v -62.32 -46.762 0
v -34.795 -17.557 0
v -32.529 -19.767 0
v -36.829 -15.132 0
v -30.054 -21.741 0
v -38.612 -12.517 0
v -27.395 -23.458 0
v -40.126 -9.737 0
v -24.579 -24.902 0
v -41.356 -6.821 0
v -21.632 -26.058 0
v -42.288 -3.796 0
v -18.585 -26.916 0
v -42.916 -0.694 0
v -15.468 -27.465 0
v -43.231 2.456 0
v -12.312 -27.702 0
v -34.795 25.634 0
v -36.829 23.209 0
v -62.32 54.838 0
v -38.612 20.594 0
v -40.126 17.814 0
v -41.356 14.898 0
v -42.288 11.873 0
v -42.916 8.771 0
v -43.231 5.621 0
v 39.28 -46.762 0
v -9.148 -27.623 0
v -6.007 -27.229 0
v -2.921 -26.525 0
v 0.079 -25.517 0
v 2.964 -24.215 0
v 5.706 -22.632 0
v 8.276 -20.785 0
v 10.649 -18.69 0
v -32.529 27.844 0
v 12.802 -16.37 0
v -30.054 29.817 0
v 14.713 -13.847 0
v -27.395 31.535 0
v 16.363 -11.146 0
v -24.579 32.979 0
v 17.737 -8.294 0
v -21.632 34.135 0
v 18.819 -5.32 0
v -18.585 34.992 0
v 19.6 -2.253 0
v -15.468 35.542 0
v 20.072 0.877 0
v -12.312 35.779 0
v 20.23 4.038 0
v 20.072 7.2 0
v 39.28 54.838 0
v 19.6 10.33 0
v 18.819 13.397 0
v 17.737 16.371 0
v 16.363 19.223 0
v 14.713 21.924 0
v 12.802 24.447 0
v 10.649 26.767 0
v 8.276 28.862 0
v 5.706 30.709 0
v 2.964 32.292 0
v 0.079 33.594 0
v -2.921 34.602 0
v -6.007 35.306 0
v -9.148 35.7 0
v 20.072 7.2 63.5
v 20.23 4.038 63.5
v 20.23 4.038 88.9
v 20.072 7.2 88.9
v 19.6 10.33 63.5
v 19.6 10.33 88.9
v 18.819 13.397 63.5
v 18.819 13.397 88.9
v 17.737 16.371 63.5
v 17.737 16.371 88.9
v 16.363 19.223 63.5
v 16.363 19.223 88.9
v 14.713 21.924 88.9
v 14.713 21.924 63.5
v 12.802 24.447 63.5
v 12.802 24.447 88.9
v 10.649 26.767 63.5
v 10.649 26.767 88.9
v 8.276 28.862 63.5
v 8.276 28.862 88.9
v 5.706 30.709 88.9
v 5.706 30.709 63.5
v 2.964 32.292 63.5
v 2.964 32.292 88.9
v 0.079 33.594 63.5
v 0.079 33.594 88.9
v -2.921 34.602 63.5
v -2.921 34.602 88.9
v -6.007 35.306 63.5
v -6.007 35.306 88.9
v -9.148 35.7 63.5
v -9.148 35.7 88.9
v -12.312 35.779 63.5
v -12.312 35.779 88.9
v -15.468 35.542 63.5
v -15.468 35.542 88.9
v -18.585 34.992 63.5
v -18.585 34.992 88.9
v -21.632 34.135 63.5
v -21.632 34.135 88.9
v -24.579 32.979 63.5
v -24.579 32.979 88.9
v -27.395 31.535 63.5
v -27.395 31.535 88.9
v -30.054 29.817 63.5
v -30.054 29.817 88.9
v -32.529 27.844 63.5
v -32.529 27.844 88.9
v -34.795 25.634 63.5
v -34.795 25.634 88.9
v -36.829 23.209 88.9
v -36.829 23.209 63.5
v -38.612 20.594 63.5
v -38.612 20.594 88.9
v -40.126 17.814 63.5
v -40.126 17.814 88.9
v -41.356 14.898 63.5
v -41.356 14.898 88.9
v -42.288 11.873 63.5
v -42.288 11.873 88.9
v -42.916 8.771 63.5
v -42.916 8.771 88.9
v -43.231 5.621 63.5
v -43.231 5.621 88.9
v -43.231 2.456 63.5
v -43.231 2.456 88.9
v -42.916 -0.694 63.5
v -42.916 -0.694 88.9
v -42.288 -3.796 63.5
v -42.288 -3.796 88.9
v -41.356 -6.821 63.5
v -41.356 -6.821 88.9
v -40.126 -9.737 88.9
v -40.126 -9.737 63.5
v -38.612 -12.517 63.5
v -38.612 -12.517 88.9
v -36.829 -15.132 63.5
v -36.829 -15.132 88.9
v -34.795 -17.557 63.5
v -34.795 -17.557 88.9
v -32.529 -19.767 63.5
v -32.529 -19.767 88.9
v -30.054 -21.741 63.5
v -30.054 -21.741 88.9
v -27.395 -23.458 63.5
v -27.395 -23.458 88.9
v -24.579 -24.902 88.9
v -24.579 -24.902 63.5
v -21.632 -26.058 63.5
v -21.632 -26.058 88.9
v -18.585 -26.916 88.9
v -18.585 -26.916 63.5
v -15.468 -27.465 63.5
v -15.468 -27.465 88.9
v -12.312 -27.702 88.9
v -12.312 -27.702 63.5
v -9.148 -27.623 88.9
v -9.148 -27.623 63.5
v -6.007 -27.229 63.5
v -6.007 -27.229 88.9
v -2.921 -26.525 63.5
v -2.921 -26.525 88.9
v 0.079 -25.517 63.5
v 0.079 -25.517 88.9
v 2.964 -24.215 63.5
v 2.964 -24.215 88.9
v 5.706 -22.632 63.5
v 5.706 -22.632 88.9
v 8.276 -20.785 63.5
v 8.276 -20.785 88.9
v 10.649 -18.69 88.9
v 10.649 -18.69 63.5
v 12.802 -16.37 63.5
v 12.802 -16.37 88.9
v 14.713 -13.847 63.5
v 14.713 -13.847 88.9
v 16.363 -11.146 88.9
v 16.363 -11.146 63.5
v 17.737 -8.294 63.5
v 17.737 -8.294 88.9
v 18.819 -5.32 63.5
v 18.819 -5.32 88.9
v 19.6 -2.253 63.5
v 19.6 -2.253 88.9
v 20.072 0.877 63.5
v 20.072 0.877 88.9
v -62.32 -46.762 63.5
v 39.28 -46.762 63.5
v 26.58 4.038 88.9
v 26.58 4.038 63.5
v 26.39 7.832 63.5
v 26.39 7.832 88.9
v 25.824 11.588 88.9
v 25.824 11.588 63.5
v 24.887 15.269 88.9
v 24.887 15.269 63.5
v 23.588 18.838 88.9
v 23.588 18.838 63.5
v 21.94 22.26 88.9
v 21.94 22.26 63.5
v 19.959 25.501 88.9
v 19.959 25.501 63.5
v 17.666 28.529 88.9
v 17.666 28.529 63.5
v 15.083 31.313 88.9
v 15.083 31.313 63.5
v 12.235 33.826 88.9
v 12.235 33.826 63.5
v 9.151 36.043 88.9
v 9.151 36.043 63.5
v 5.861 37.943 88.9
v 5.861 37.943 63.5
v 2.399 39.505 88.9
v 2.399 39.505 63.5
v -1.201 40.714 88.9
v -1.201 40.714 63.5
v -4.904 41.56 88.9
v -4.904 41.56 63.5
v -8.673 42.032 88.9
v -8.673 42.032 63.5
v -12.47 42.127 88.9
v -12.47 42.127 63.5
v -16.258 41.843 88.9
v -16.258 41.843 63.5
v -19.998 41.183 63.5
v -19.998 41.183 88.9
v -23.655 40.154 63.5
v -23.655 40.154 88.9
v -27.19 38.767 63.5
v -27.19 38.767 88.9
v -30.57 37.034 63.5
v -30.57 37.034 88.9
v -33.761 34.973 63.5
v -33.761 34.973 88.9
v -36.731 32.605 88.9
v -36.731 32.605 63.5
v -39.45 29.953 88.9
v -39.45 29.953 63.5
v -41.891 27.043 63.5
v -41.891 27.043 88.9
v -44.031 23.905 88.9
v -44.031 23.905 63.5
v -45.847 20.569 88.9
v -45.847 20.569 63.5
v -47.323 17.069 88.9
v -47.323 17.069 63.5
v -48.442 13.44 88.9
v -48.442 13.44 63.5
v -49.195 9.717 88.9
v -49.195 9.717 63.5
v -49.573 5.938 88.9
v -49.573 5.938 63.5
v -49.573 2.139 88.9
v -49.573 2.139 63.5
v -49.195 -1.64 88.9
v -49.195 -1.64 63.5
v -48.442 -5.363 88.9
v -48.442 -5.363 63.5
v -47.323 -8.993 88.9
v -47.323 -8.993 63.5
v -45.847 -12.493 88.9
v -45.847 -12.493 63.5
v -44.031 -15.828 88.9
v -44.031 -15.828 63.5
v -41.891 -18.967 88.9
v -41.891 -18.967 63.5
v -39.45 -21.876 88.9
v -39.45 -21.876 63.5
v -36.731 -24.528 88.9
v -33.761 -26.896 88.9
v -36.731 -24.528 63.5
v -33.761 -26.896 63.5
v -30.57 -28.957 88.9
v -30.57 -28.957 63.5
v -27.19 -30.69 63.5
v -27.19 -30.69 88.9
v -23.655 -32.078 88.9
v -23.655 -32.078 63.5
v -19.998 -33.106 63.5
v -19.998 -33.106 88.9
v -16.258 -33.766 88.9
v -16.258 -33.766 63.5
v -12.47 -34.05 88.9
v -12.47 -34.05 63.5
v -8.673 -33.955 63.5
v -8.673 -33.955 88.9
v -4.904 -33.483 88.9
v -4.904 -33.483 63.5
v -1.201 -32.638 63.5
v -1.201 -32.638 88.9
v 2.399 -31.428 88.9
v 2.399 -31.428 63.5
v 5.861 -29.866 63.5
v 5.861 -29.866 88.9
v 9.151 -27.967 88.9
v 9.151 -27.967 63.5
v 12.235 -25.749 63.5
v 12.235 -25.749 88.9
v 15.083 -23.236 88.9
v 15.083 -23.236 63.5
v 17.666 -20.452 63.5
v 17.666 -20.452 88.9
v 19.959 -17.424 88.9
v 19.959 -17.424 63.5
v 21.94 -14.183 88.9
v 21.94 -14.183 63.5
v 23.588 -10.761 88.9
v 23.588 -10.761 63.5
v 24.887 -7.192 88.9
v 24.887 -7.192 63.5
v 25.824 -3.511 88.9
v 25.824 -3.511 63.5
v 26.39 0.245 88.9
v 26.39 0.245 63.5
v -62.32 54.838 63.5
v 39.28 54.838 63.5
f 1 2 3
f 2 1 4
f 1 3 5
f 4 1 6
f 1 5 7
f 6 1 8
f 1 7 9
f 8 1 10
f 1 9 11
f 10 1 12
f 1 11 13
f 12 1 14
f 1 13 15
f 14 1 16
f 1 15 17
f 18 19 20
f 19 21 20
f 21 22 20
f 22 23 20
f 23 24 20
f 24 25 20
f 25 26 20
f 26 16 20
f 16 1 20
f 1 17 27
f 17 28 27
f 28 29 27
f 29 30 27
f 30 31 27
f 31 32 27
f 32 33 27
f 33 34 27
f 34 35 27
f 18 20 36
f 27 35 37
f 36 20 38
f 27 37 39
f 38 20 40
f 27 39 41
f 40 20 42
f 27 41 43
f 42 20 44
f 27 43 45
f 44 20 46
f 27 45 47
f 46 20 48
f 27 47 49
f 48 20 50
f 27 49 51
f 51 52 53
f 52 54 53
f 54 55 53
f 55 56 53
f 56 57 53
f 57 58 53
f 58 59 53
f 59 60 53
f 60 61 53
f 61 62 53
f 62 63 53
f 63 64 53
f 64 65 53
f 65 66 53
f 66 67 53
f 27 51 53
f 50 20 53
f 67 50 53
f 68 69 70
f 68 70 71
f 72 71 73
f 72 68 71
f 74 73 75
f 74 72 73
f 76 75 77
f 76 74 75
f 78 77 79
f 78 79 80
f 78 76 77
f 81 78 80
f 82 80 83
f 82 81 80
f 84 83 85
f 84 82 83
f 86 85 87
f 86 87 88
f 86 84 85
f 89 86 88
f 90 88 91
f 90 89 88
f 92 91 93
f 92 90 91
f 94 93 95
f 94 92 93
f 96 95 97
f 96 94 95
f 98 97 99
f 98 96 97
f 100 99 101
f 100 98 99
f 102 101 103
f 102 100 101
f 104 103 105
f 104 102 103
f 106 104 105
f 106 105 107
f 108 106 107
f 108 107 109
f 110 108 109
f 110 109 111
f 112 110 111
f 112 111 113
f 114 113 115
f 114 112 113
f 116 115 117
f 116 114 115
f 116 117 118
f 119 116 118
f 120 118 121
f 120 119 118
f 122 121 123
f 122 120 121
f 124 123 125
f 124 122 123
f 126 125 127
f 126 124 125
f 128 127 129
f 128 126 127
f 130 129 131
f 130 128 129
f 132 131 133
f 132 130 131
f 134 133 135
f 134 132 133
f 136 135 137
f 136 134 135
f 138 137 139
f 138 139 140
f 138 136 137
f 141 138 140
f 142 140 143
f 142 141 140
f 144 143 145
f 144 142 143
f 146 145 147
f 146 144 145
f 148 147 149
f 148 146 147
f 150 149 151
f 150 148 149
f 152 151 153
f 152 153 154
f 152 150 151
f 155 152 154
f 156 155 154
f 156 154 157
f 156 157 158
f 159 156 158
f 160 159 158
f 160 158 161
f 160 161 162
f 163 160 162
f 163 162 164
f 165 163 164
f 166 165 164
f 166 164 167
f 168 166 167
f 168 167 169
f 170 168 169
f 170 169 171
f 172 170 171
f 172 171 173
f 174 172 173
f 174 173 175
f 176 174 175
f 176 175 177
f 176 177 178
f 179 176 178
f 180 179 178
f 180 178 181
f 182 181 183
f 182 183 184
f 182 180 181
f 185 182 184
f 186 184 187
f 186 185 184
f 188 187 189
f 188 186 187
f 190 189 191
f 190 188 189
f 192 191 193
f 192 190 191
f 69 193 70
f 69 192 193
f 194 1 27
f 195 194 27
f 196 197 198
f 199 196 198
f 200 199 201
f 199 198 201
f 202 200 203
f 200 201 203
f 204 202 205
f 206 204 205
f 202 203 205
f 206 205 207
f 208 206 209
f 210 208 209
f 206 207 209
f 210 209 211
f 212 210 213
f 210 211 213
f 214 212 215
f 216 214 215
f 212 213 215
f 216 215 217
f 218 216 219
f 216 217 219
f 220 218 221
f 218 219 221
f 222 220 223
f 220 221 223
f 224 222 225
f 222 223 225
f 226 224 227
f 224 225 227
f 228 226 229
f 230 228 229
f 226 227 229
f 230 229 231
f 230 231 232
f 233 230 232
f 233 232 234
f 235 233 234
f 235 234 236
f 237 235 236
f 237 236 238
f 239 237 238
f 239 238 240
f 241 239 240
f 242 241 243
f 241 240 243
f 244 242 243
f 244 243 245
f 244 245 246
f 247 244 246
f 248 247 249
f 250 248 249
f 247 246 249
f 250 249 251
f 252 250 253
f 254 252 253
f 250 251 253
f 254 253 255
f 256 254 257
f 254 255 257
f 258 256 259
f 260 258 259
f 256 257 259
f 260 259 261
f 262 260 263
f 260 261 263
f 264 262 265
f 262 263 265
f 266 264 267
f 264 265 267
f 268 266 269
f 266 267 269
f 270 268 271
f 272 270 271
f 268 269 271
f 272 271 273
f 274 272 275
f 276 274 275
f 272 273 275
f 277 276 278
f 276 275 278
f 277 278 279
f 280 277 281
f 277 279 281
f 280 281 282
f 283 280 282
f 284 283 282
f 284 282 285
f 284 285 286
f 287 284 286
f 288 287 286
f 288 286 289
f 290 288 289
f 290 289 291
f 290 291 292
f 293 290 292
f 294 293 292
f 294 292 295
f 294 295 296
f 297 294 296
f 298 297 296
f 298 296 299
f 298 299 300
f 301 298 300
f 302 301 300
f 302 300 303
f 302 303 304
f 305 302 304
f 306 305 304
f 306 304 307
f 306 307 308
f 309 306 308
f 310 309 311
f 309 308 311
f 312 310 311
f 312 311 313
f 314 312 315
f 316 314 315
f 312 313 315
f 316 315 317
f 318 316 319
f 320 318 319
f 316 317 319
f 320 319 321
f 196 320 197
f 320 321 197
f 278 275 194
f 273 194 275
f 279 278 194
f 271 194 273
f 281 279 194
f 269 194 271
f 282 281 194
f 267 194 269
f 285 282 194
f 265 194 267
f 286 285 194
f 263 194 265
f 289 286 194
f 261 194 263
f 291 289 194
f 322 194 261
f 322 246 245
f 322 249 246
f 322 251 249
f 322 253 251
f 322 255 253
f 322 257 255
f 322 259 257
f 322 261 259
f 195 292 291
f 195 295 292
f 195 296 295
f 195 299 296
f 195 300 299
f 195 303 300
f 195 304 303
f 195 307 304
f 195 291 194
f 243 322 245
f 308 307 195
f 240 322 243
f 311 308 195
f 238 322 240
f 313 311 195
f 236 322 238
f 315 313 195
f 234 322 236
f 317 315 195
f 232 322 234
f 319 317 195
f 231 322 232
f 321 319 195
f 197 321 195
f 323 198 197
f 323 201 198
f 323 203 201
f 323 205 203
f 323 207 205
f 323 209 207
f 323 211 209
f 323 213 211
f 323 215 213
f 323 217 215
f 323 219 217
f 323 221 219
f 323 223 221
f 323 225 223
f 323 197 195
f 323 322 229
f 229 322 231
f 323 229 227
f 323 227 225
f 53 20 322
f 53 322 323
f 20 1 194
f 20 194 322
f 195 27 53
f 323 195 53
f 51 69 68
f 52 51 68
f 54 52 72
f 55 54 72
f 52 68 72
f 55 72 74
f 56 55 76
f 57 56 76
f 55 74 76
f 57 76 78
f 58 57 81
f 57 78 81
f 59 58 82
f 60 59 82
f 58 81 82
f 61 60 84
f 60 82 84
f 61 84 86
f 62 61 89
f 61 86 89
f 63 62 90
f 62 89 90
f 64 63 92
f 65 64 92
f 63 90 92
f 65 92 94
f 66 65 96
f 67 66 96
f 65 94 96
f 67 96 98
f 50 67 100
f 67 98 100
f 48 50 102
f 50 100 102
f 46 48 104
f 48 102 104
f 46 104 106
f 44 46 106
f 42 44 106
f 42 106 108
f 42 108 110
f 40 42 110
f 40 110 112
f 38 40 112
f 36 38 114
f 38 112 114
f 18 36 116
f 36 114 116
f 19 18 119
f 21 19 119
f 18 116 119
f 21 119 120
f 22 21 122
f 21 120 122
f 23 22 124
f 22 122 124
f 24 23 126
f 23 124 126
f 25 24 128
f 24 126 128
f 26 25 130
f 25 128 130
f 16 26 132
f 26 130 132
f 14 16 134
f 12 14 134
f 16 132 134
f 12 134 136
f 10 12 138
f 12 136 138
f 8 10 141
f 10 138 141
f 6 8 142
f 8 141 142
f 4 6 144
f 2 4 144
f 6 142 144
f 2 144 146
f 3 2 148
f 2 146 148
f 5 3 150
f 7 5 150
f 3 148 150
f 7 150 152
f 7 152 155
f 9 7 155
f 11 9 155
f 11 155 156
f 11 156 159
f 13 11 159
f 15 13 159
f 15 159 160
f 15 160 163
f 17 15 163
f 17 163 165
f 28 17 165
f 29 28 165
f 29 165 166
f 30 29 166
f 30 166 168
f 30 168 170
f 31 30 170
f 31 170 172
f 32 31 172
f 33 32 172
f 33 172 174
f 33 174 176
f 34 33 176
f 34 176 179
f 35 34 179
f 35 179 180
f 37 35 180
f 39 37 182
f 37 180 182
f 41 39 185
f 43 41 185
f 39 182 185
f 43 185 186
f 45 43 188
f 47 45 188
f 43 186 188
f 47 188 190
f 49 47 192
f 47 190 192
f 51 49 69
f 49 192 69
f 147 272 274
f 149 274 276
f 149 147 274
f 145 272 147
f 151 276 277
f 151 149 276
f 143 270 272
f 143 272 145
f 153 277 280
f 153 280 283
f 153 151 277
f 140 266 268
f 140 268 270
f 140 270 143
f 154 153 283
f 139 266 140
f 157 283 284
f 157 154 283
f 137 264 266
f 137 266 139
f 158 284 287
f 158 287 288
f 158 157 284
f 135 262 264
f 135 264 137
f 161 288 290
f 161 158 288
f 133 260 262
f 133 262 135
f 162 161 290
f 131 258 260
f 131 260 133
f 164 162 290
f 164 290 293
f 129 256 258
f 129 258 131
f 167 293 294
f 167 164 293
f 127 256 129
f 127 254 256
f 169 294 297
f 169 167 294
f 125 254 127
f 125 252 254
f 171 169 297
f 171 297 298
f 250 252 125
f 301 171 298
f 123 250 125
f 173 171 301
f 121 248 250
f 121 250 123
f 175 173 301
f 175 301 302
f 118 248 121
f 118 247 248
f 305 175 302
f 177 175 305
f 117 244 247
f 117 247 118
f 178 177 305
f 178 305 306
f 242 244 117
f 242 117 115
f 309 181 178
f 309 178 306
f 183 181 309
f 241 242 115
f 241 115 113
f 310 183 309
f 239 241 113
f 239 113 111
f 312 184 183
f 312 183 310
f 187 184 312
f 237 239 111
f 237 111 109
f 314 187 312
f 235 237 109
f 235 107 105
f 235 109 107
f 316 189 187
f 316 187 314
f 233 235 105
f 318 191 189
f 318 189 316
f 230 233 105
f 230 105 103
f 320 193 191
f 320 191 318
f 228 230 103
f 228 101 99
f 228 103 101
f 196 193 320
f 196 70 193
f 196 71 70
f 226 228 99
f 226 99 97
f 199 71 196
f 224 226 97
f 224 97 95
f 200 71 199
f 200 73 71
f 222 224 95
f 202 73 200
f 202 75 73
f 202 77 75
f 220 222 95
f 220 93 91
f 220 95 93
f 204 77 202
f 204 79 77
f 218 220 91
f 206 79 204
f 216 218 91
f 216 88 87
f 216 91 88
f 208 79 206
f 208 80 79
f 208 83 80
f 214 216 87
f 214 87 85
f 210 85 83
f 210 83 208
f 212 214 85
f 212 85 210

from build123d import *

# Parameters (mm, degrees)
F0_W      = 101.6
F0_H      = 101.6
F1_DEPTH  = 63.5
F2_R      = 38.1
F2_R_2    = 31.75
F3_DEPTH  = 25.4
F3_FACE_R = 31.75
F4_DEPTH  = 63.5


with BuildPart() as f1:
    # F0 (on Top) → F1 (new body)
    with BuildSketch(Plane.XY):
        with Locations((-11.520282, 4.038428)):
            Rectangle(F0_W, F0_H)
    extrude(amount=F1_DEPTH)

    # F2 (on face) → F3 (join)
    with BuildSketch(Plane.XY.offset(63.5)):
        with Locations((-11.520282, 4.038428)):
            Circle(F2_R)
        with Locations((-11.520282, 4.038428)):
            Circle(F2_R_2, mode=Mode.SUBTRACT)
    extrude(amount=F3_DEPTH)

    # F3_face (on face) → F4 (cut)
    with BuildSketch(Plane(origin=(-11.520282, 4.038428, 63.5), x_dir=(1, 0, 0), z_dir=(0, 0, 1))):
        Circle(F3_FACE_R)
    extrude(amount=-F4_DEPTH, mode=Mode.SUBTRACT)


solid = f1.part
